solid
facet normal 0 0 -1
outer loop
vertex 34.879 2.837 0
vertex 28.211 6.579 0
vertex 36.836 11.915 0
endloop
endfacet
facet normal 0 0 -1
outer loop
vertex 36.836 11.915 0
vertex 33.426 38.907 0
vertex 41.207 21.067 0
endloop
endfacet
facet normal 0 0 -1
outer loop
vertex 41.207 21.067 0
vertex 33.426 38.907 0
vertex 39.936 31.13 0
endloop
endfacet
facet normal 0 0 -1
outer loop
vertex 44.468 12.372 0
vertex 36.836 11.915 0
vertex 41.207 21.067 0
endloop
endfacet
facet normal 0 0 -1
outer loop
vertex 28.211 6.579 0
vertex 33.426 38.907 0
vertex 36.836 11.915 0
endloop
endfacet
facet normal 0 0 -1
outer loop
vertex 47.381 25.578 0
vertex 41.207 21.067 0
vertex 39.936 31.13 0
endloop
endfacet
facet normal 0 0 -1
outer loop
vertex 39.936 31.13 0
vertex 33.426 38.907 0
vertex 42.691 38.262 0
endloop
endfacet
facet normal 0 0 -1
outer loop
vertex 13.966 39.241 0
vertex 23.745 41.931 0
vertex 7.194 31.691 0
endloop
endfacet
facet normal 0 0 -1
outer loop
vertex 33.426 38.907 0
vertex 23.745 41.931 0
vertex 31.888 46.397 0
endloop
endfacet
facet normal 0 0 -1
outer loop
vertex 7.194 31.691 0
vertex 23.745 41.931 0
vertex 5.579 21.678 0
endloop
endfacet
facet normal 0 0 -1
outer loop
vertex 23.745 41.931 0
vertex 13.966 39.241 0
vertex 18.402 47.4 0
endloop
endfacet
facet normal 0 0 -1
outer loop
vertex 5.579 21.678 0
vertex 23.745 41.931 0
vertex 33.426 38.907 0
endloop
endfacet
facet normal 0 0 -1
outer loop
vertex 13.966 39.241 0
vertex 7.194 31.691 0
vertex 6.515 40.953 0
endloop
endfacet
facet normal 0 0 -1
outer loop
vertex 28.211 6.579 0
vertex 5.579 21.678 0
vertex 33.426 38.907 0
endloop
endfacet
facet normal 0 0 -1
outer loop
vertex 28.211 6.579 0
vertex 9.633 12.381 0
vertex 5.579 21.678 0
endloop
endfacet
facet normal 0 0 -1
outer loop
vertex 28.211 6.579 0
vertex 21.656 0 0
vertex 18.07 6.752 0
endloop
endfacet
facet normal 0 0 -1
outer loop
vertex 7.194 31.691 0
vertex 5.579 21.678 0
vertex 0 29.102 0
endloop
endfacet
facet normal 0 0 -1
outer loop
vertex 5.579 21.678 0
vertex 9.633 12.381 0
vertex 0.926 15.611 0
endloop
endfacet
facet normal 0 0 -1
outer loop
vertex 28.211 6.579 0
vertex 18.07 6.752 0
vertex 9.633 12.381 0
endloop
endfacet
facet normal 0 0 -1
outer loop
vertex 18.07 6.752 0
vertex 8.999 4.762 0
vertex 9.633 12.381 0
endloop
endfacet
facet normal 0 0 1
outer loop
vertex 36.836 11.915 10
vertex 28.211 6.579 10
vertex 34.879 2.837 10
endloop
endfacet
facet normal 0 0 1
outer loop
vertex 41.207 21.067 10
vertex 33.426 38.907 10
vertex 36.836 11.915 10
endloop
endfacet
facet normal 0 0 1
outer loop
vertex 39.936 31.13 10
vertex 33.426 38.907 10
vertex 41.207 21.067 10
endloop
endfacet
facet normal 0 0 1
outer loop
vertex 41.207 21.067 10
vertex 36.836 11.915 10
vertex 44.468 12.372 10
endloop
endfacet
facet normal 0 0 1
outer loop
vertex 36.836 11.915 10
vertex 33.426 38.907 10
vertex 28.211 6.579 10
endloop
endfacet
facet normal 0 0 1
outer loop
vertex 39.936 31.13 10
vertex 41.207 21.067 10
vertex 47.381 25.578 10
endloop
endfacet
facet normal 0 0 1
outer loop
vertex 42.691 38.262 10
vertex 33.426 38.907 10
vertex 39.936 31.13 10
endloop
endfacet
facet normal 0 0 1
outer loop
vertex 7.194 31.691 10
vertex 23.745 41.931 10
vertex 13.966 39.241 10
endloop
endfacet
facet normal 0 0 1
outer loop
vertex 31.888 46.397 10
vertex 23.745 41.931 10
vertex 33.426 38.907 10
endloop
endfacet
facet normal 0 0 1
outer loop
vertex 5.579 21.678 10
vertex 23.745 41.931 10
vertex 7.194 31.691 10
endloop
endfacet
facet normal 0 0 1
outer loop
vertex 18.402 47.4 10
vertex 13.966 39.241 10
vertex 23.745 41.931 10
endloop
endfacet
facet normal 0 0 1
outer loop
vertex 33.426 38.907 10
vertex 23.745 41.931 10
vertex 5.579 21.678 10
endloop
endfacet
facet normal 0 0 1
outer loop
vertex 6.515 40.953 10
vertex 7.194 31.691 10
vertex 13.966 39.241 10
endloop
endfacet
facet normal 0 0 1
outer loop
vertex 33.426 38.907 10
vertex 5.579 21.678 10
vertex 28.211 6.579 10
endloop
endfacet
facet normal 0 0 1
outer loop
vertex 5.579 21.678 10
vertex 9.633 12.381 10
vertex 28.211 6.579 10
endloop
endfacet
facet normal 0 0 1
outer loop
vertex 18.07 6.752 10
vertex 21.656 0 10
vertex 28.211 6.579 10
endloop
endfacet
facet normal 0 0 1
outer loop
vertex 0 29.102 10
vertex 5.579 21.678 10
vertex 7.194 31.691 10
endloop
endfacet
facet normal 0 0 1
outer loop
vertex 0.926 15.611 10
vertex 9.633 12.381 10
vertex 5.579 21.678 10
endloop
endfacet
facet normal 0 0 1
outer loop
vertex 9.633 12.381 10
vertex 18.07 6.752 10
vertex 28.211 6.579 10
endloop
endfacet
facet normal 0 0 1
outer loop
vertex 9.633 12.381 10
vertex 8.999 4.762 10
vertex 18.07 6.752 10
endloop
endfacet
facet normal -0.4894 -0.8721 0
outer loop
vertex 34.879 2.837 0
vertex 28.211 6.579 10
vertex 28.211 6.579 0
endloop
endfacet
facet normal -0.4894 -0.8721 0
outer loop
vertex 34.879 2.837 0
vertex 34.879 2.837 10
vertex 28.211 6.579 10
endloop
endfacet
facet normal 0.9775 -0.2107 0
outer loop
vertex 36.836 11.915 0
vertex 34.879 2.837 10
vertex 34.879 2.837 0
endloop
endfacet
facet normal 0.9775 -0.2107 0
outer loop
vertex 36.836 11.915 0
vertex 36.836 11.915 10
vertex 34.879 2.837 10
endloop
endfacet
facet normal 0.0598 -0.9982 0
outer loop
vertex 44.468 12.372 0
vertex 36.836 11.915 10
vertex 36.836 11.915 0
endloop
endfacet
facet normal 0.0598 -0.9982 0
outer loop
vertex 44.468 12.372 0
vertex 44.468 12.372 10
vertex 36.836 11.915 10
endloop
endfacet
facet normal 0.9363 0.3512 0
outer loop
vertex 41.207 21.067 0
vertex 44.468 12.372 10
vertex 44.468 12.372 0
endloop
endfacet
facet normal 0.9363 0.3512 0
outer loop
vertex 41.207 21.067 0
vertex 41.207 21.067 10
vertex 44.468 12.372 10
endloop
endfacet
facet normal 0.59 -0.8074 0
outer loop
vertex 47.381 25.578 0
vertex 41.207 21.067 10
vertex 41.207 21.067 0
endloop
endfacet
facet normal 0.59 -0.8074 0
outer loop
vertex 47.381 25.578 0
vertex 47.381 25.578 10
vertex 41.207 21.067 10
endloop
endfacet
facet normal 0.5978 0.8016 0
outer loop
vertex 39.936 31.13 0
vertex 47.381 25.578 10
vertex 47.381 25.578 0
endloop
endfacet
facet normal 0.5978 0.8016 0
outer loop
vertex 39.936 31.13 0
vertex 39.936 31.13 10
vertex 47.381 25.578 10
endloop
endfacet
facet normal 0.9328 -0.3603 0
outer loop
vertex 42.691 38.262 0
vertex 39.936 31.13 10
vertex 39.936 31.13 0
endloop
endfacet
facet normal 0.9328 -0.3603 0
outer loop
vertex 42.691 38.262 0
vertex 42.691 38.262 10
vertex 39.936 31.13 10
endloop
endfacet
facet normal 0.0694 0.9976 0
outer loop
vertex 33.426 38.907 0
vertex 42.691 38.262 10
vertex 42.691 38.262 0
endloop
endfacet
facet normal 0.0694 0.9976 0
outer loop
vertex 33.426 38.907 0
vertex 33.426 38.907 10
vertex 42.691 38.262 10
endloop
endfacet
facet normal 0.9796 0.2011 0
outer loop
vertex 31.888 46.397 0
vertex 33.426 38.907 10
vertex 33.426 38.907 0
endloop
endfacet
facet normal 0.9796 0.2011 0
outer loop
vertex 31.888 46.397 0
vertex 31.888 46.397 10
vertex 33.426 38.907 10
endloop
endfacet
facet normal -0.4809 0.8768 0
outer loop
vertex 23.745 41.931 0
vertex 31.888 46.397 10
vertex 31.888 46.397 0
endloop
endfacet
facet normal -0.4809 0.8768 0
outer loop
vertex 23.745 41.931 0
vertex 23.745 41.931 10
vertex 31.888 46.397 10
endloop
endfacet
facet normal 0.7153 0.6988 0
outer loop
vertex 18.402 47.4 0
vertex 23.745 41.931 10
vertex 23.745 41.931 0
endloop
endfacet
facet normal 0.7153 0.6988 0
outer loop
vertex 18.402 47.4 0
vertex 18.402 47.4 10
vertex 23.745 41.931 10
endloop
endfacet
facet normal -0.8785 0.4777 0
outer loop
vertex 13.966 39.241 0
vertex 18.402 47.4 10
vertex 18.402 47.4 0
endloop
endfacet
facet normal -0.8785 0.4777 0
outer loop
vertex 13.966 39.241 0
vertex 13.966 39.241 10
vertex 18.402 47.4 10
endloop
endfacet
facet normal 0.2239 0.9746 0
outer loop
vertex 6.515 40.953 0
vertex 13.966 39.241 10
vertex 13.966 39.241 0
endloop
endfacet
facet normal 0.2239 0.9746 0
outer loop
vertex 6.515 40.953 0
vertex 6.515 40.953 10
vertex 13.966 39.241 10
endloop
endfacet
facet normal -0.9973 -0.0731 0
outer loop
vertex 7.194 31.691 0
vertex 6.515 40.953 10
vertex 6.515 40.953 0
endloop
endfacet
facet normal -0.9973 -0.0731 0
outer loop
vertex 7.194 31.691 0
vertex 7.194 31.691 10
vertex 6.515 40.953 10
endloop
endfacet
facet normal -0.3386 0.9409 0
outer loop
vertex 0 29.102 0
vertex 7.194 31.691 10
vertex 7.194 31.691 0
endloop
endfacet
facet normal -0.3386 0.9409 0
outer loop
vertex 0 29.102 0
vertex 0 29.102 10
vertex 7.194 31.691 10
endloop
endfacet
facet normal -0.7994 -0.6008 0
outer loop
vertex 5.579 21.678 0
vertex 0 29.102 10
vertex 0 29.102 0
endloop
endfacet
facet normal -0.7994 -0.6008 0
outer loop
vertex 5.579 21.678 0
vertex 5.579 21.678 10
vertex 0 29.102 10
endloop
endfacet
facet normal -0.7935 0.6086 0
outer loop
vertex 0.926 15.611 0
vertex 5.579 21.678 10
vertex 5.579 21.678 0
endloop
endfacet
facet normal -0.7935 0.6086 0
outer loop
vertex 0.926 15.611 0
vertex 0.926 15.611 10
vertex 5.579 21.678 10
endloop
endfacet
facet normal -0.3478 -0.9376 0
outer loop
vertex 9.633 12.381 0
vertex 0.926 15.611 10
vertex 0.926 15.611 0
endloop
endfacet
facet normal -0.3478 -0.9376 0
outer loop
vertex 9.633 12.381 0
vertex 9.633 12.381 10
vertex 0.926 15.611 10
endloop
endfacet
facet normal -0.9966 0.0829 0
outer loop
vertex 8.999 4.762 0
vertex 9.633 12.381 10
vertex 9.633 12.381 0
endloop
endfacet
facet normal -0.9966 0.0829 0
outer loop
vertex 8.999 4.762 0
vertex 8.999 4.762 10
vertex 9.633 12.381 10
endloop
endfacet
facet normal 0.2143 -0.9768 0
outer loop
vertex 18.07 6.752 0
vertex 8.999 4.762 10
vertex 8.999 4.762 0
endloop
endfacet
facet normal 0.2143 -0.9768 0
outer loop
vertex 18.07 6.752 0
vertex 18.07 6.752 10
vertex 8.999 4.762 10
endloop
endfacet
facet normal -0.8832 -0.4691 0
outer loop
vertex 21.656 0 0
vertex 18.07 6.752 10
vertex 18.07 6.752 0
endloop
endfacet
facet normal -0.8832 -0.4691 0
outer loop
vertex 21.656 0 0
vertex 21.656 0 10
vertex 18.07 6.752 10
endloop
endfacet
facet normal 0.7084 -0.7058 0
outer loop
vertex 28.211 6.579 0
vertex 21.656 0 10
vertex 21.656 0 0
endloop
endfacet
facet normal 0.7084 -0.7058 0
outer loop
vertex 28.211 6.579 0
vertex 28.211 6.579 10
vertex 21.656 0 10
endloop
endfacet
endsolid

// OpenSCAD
$fn = 32;

// ----------------------------------------------------------------------
// Chain sprocket: 11 teeth, 18 mm root radius
// ----------------------------------------------------------------------

// --- parameters (mm) ---
profile_height = 10;      // extrusion height
profile_points = 22;      // points of the closed outline

profile = [[41.207, 21.067], [47.381, 25.578], [39.936, 31.13], [42.691, 38.262], [33.426, 38.907], [31.888, 46.397], [23.745, 41.931], [18.402, 47.4], [13.966, 39.241], [6.515, 40.953], [7.194, 31.691], [0, 29.102], [5.579, 21.678], [0.926, 15.611], [9.633, 12.381], [8.999, 4.762], [18.07, 6.752], [21.656, 0], [28.211, 6.579], [34.879, 2.837], [36.836, 11.915], [44.468, 12.372]];  // single closed polygon, 22 points, counter clockwise

// --- the one profile operation ---
linear_extrude(height = profile_height) polygon(points = profile);
